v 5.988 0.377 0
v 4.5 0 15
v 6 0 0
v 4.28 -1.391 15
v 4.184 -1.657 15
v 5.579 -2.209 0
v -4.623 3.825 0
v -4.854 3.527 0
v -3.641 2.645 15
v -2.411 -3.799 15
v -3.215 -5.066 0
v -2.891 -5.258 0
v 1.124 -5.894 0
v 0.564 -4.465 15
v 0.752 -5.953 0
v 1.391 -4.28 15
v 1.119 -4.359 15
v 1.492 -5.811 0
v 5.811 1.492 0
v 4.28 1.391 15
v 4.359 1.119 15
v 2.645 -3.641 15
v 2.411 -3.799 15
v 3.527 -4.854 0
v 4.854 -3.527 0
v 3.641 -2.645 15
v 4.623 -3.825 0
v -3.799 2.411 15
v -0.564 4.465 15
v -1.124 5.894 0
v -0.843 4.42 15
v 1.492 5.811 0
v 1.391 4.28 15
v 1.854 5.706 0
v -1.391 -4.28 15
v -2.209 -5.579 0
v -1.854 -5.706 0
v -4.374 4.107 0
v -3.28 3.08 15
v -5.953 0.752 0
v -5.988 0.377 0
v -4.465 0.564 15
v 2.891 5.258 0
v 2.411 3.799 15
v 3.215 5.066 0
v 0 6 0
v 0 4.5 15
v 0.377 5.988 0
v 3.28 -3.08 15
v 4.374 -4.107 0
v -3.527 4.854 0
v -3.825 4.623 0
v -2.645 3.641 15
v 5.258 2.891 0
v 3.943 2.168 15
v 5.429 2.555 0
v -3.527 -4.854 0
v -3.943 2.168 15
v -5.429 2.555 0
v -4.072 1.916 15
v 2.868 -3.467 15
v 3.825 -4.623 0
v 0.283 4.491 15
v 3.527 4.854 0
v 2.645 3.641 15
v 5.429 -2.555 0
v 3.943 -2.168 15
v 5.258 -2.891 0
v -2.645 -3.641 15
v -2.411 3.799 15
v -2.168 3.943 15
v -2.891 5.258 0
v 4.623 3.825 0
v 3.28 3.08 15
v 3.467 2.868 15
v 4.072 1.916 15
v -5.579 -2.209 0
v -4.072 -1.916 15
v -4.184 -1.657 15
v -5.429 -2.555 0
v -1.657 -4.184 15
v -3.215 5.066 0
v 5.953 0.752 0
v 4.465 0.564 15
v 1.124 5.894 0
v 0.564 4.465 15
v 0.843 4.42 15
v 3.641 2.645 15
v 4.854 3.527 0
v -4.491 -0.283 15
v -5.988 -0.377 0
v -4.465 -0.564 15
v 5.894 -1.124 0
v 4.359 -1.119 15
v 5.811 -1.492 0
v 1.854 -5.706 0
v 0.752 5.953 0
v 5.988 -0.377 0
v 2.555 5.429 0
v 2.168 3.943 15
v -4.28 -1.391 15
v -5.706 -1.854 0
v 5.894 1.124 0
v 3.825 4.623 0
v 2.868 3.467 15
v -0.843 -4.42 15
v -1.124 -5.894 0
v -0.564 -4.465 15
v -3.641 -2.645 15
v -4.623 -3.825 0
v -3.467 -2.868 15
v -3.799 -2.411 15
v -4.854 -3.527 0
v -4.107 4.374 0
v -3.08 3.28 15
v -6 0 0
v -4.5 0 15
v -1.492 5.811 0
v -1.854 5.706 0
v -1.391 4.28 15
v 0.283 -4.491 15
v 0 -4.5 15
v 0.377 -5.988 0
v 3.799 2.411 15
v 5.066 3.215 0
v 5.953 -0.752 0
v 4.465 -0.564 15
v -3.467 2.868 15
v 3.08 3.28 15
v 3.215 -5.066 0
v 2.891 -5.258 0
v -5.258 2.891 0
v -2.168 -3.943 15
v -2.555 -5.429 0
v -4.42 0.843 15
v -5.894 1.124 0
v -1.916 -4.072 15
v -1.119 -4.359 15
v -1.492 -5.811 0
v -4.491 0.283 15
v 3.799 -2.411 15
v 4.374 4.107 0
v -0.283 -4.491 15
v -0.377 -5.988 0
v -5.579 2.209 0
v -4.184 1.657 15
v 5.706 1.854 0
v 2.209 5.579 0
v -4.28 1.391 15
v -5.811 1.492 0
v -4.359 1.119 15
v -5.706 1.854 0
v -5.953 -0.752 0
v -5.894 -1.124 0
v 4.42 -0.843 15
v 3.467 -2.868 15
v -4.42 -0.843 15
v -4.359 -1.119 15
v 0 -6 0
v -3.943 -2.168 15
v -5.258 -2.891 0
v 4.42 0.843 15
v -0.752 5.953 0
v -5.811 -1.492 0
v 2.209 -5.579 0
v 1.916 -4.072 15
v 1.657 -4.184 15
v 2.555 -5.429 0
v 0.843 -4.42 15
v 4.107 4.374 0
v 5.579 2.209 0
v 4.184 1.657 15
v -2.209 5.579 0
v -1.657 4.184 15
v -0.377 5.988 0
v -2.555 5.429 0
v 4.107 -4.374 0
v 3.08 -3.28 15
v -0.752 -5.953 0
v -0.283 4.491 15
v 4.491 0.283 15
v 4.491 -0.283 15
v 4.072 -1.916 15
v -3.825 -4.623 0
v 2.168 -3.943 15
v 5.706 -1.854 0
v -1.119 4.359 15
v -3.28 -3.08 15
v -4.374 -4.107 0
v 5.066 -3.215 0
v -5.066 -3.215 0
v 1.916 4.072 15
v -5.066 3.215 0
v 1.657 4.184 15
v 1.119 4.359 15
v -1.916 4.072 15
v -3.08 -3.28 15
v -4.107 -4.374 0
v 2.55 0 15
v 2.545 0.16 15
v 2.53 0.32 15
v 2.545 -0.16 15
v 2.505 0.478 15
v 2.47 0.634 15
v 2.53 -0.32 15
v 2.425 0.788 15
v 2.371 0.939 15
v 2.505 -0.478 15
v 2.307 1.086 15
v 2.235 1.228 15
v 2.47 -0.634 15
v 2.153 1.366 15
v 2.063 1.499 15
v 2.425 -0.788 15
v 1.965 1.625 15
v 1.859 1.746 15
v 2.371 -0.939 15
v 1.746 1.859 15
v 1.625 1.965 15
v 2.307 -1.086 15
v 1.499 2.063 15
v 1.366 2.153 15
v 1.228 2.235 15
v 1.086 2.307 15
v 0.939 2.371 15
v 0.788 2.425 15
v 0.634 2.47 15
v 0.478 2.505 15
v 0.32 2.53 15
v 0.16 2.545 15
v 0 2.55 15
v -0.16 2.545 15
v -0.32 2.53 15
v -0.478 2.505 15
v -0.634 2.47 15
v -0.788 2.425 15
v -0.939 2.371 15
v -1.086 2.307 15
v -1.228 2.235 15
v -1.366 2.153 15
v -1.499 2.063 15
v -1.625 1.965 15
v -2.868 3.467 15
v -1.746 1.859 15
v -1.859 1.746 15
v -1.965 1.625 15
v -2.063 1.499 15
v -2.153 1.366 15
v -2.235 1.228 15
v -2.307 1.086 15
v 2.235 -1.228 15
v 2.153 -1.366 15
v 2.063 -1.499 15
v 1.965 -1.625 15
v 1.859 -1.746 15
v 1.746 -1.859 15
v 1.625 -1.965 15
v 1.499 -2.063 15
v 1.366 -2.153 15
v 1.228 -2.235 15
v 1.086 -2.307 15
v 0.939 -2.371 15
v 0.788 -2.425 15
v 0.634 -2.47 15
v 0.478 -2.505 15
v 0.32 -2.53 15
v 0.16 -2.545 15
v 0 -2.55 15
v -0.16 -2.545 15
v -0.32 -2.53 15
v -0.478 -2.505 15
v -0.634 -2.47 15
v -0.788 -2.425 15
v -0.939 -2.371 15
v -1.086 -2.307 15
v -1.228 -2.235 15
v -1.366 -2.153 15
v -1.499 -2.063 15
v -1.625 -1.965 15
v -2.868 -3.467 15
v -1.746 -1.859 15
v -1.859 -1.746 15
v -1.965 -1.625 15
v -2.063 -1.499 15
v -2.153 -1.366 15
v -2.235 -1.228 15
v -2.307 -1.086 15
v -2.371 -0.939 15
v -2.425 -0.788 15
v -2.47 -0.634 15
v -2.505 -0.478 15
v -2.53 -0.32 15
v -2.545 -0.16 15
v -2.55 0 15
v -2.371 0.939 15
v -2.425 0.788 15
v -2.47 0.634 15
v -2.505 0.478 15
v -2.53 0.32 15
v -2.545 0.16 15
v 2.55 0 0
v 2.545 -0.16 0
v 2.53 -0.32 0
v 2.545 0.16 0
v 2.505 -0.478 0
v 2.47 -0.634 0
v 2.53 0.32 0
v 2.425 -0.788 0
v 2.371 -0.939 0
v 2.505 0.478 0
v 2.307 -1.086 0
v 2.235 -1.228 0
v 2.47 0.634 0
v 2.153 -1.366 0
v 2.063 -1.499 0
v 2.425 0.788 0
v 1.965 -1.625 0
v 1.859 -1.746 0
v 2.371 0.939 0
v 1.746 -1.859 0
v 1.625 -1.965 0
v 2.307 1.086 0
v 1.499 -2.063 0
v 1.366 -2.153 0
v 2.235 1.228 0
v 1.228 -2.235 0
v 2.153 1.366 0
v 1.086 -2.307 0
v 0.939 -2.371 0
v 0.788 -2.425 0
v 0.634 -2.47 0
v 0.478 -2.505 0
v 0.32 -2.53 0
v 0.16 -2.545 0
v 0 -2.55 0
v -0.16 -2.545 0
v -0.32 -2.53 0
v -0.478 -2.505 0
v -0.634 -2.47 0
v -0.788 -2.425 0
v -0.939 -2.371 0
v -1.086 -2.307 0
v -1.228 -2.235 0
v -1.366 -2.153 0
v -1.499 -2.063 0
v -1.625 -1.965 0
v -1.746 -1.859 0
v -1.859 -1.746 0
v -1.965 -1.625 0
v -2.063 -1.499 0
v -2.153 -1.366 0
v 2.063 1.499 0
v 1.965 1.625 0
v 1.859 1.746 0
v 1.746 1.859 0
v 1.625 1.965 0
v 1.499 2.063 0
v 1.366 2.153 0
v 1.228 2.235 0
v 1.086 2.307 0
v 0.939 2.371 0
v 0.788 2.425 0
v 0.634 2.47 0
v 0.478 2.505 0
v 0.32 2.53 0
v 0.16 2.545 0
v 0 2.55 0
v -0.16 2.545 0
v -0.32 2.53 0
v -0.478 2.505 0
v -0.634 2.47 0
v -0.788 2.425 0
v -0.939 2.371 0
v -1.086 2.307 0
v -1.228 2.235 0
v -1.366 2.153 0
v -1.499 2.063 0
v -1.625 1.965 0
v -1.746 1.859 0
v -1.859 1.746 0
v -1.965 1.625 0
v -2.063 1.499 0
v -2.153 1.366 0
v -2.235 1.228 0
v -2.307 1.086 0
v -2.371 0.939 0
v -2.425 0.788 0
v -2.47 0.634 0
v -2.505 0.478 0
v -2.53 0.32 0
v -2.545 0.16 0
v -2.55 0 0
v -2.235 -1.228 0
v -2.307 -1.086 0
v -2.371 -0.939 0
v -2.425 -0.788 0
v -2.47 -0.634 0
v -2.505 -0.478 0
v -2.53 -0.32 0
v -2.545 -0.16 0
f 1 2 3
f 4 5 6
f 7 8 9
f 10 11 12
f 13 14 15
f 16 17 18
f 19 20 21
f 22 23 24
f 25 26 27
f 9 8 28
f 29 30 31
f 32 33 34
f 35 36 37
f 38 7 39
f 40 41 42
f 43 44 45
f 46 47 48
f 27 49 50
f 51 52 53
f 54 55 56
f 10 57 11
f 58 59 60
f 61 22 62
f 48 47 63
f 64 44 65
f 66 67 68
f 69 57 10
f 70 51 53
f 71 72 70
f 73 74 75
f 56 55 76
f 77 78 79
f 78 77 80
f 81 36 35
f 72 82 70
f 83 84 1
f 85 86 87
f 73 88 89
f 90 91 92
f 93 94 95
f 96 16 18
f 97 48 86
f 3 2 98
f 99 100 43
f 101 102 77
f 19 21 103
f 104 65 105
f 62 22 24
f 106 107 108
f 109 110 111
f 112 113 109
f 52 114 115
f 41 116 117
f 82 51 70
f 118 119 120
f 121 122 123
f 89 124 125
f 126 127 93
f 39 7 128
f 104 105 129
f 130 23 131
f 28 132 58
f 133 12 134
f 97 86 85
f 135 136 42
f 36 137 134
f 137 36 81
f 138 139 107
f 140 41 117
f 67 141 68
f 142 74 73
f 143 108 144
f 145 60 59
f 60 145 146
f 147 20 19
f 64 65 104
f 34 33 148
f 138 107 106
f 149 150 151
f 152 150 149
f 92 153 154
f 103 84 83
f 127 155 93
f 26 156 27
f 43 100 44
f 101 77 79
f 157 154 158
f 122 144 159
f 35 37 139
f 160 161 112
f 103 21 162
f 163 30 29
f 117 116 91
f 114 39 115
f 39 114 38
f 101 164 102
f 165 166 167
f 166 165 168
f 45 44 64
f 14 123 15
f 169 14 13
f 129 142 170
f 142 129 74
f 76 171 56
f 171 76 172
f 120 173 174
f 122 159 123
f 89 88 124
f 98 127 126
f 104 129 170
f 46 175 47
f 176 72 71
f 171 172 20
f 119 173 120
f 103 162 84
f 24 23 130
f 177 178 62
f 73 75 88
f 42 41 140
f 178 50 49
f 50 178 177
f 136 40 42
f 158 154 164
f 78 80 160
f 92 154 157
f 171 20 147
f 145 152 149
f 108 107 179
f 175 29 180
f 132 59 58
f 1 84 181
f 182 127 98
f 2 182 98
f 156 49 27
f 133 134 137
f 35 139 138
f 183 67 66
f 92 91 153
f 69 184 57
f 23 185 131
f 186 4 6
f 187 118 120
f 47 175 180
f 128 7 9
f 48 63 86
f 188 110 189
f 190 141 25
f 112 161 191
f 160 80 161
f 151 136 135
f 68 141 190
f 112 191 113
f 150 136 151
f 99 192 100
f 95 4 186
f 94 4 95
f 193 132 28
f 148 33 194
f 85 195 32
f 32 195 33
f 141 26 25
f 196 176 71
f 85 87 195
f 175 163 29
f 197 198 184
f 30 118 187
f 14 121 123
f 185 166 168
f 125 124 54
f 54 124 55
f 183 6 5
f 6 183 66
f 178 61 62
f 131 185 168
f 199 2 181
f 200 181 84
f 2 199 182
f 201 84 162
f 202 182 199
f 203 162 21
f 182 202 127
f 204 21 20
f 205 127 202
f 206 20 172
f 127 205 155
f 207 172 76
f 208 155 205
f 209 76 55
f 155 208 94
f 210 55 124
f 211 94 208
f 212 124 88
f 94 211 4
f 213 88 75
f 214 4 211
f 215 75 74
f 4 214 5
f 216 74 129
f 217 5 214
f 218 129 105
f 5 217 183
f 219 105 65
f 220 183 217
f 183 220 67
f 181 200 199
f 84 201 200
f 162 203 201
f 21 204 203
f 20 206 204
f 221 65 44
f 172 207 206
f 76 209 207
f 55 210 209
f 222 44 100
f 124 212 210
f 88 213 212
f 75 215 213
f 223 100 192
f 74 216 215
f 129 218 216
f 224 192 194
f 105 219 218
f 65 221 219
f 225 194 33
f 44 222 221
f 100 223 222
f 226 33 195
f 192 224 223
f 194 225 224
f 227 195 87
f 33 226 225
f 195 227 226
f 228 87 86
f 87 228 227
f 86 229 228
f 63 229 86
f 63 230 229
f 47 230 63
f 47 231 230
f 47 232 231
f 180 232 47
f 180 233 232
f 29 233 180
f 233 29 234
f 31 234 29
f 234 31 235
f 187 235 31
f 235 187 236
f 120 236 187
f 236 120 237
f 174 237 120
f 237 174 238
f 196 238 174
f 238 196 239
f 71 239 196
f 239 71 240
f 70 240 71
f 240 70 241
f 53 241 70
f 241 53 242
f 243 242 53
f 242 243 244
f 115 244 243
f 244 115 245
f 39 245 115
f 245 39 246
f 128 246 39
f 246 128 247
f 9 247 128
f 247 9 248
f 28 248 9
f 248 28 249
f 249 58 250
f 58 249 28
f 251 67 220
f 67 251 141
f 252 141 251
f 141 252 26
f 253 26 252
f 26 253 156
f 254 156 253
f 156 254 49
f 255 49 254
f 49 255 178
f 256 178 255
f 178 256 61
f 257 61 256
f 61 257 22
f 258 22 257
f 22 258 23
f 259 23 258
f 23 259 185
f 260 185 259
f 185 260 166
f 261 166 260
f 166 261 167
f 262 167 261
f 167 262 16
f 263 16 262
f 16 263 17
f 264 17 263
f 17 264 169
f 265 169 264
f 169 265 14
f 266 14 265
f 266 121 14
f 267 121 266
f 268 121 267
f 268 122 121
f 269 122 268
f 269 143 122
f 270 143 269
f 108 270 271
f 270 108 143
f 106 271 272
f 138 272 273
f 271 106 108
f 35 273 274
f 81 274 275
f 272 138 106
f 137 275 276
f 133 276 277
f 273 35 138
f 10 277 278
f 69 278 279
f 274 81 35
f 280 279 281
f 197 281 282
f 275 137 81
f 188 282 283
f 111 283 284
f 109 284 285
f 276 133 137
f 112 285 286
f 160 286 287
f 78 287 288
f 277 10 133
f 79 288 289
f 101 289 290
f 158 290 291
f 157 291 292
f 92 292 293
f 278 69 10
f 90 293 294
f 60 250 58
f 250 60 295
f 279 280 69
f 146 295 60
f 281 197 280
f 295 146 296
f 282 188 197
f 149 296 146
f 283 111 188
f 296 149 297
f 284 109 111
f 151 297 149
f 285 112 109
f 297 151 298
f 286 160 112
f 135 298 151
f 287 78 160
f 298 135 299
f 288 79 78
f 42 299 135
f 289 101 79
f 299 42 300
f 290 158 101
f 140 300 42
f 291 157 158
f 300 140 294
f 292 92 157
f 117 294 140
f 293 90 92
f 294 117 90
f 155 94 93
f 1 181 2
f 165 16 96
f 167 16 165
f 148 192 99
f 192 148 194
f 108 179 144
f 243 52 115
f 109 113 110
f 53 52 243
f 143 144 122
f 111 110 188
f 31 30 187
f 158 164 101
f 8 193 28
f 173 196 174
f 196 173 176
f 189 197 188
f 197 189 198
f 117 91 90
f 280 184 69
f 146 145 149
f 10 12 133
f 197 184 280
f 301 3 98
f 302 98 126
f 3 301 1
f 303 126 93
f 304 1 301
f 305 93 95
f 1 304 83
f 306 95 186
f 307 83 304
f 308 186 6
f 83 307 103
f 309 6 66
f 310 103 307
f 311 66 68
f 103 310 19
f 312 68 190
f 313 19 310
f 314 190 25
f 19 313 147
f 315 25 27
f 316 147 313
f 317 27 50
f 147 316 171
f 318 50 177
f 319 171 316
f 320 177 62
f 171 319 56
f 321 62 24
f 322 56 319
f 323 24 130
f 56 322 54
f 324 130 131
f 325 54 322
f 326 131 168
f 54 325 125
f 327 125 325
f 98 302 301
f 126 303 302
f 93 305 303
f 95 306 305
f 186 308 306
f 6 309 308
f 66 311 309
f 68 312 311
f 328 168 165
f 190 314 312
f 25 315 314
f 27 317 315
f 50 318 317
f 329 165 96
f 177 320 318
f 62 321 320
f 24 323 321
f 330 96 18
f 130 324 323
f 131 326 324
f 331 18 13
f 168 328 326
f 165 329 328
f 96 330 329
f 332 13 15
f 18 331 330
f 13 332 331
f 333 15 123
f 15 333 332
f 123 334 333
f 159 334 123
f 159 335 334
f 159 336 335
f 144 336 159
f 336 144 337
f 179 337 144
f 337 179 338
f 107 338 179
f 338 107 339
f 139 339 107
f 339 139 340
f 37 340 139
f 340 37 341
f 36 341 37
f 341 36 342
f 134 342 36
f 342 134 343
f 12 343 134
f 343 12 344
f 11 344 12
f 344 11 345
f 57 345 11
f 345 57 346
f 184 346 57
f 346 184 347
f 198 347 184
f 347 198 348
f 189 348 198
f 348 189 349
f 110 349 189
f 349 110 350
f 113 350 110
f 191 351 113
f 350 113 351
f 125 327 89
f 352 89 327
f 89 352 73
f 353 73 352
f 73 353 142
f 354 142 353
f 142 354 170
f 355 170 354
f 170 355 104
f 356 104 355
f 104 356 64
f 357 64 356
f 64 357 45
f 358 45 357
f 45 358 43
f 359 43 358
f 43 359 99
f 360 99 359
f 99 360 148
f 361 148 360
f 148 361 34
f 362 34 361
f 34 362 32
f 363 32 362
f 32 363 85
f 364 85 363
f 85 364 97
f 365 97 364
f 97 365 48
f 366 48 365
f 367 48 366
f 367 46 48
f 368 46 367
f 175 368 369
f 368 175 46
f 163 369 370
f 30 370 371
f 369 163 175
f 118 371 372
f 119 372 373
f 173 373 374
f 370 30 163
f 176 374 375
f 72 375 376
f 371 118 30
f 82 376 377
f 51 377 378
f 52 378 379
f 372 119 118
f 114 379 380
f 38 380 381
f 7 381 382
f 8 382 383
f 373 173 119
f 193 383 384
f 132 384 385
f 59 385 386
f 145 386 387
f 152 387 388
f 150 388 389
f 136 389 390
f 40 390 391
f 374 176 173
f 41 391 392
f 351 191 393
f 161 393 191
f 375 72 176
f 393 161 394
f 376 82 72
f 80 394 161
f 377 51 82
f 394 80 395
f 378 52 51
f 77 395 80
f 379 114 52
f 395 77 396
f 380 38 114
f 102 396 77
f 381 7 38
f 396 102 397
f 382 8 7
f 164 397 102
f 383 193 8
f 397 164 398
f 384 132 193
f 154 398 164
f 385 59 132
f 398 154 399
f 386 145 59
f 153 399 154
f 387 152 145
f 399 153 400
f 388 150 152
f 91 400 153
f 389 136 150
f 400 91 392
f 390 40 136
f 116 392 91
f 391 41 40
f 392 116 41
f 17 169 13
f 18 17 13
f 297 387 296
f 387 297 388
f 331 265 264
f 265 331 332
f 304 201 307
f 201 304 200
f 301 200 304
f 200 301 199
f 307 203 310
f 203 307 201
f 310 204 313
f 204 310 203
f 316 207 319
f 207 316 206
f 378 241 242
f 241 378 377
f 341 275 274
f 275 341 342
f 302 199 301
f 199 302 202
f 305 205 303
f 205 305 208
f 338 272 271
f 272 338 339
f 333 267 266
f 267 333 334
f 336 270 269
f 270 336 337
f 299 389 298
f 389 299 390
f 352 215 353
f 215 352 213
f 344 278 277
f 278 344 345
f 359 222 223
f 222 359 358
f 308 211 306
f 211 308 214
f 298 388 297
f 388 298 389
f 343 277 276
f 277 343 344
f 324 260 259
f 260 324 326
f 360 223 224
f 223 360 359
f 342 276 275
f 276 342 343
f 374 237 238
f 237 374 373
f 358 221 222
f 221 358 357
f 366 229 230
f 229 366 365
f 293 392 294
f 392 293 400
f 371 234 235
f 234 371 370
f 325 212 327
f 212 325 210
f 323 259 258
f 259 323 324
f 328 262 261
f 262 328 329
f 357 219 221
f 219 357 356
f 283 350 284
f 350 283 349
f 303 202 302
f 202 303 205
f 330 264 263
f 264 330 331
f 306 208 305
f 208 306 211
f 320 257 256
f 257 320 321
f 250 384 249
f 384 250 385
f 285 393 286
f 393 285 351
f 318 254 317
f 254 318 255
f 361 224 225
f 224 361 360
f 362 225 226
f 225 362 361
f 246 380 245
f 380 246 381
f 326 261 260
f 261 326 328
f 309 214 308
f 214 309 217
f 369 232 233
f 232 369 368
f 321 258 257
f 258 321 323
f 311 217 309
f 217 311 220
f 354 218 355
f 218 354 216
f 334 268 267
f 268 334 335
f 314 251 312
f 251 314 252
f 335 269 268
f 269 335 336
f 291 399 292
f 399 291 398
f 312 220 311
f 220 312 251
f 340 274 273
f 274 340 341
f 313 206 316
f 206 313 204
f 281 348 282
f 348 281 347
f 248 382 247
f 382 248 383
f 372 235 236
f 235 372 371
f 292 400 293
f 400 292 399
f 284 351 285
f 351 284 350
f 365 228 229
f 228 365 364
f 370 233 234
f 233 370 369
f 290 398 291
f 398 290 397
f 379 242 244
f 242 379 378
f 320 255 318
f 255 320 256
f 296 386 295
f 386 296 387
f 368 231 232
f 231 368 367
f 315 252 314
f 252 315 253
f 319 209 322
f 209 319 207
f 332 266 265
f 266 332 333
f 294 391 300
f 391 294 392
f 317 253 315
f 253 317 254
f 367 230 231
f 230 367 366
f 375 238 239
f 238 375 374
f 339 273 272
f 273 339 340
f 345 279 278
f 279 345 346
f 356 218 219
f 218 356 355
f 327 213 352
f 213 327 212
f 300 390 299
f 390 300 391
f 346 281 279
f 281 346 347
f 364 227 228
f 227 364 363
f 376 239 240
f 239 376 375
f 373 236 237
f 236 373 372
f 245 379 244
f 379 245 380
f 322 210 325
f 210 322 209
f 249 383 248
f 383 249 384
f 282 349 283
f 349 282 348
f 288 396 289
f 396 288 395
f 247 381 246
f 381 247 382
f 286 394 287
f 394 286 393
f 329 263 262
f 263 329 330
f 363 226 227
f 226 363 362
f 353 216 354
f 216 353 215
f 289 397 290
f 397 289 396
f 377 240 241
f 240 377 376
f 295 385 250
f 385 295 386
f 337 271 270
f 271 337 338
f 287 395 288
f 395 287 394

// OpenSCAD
$fn=100;

// misc file
//
// everything else belongs in this file, currently
// the PCB feet, the PCB spacer and a wall prototype

if($preview){
    for(i=[-1:2:1],j=[-1:2:1]){
        color("DeepPink")translate([15*i,15*j-30,0])cap();
        color("HotPink")translate([10*i,10*j+20,0])foot();
    }
    color("PaleVioletRed")translate([35,-10,0])wall_patterned();
} else {
    foot();
    *cap();
}

module foot(){
    difference(){
        union(){
            cylinder(d1=12,d2=9,h=15);
        }union(){
            cylinder(d=5.1,h=15);
        }
    }
}

module cap(){
    difference(){
        union(){
            translate([0,0,1.5])minkowski(){
                cube([19,19,0.5],center=true);
                rotate([0,0,45])cube([1,1,0.5],center=true);
            }
            hull(){
                translate([0,0,6/2+0.5])cube([8,8,4],center=true);
                translate([0,0,2/2+0.5])cube([12,12,1],center=true);
            }
        }union(){
            translate([0,0,-0.5])cylinder(d=5.2,h=3);
            translate([0,0,4/2+2.1])cube([7.3,7.3,4.1],center=true);
            
            translate([0,0,4/2+2.1])rotate([0,0,45])cube([1.7,20,4.1],center=true);
            translate([0,0,4/2+2.1])rotate([0,0,-45])cube([1.7,20,4.1],center=true);
        }
    }
}

module wall_patterned(l=50){
    w=76;
    h=4;
    gw=2;//gl=10;
    gl=round((l-16)/10)-1;
    difference(){
        union(){
            translate([l/2,0,h/2])cube([l,w,h],center=true);
        }union(){
            *translate([l/2,0,h/2-0.1])cube([l-16,w-16,h+0.2],center=true);
            for(i=[-gw:1:gw],j=[0:1:gl]){
                translate([12*j+8+5,12*i,h/2])rotate([0,0,12])cube([10,10,h+0.2],center=true);
            }
        }
    }
}
